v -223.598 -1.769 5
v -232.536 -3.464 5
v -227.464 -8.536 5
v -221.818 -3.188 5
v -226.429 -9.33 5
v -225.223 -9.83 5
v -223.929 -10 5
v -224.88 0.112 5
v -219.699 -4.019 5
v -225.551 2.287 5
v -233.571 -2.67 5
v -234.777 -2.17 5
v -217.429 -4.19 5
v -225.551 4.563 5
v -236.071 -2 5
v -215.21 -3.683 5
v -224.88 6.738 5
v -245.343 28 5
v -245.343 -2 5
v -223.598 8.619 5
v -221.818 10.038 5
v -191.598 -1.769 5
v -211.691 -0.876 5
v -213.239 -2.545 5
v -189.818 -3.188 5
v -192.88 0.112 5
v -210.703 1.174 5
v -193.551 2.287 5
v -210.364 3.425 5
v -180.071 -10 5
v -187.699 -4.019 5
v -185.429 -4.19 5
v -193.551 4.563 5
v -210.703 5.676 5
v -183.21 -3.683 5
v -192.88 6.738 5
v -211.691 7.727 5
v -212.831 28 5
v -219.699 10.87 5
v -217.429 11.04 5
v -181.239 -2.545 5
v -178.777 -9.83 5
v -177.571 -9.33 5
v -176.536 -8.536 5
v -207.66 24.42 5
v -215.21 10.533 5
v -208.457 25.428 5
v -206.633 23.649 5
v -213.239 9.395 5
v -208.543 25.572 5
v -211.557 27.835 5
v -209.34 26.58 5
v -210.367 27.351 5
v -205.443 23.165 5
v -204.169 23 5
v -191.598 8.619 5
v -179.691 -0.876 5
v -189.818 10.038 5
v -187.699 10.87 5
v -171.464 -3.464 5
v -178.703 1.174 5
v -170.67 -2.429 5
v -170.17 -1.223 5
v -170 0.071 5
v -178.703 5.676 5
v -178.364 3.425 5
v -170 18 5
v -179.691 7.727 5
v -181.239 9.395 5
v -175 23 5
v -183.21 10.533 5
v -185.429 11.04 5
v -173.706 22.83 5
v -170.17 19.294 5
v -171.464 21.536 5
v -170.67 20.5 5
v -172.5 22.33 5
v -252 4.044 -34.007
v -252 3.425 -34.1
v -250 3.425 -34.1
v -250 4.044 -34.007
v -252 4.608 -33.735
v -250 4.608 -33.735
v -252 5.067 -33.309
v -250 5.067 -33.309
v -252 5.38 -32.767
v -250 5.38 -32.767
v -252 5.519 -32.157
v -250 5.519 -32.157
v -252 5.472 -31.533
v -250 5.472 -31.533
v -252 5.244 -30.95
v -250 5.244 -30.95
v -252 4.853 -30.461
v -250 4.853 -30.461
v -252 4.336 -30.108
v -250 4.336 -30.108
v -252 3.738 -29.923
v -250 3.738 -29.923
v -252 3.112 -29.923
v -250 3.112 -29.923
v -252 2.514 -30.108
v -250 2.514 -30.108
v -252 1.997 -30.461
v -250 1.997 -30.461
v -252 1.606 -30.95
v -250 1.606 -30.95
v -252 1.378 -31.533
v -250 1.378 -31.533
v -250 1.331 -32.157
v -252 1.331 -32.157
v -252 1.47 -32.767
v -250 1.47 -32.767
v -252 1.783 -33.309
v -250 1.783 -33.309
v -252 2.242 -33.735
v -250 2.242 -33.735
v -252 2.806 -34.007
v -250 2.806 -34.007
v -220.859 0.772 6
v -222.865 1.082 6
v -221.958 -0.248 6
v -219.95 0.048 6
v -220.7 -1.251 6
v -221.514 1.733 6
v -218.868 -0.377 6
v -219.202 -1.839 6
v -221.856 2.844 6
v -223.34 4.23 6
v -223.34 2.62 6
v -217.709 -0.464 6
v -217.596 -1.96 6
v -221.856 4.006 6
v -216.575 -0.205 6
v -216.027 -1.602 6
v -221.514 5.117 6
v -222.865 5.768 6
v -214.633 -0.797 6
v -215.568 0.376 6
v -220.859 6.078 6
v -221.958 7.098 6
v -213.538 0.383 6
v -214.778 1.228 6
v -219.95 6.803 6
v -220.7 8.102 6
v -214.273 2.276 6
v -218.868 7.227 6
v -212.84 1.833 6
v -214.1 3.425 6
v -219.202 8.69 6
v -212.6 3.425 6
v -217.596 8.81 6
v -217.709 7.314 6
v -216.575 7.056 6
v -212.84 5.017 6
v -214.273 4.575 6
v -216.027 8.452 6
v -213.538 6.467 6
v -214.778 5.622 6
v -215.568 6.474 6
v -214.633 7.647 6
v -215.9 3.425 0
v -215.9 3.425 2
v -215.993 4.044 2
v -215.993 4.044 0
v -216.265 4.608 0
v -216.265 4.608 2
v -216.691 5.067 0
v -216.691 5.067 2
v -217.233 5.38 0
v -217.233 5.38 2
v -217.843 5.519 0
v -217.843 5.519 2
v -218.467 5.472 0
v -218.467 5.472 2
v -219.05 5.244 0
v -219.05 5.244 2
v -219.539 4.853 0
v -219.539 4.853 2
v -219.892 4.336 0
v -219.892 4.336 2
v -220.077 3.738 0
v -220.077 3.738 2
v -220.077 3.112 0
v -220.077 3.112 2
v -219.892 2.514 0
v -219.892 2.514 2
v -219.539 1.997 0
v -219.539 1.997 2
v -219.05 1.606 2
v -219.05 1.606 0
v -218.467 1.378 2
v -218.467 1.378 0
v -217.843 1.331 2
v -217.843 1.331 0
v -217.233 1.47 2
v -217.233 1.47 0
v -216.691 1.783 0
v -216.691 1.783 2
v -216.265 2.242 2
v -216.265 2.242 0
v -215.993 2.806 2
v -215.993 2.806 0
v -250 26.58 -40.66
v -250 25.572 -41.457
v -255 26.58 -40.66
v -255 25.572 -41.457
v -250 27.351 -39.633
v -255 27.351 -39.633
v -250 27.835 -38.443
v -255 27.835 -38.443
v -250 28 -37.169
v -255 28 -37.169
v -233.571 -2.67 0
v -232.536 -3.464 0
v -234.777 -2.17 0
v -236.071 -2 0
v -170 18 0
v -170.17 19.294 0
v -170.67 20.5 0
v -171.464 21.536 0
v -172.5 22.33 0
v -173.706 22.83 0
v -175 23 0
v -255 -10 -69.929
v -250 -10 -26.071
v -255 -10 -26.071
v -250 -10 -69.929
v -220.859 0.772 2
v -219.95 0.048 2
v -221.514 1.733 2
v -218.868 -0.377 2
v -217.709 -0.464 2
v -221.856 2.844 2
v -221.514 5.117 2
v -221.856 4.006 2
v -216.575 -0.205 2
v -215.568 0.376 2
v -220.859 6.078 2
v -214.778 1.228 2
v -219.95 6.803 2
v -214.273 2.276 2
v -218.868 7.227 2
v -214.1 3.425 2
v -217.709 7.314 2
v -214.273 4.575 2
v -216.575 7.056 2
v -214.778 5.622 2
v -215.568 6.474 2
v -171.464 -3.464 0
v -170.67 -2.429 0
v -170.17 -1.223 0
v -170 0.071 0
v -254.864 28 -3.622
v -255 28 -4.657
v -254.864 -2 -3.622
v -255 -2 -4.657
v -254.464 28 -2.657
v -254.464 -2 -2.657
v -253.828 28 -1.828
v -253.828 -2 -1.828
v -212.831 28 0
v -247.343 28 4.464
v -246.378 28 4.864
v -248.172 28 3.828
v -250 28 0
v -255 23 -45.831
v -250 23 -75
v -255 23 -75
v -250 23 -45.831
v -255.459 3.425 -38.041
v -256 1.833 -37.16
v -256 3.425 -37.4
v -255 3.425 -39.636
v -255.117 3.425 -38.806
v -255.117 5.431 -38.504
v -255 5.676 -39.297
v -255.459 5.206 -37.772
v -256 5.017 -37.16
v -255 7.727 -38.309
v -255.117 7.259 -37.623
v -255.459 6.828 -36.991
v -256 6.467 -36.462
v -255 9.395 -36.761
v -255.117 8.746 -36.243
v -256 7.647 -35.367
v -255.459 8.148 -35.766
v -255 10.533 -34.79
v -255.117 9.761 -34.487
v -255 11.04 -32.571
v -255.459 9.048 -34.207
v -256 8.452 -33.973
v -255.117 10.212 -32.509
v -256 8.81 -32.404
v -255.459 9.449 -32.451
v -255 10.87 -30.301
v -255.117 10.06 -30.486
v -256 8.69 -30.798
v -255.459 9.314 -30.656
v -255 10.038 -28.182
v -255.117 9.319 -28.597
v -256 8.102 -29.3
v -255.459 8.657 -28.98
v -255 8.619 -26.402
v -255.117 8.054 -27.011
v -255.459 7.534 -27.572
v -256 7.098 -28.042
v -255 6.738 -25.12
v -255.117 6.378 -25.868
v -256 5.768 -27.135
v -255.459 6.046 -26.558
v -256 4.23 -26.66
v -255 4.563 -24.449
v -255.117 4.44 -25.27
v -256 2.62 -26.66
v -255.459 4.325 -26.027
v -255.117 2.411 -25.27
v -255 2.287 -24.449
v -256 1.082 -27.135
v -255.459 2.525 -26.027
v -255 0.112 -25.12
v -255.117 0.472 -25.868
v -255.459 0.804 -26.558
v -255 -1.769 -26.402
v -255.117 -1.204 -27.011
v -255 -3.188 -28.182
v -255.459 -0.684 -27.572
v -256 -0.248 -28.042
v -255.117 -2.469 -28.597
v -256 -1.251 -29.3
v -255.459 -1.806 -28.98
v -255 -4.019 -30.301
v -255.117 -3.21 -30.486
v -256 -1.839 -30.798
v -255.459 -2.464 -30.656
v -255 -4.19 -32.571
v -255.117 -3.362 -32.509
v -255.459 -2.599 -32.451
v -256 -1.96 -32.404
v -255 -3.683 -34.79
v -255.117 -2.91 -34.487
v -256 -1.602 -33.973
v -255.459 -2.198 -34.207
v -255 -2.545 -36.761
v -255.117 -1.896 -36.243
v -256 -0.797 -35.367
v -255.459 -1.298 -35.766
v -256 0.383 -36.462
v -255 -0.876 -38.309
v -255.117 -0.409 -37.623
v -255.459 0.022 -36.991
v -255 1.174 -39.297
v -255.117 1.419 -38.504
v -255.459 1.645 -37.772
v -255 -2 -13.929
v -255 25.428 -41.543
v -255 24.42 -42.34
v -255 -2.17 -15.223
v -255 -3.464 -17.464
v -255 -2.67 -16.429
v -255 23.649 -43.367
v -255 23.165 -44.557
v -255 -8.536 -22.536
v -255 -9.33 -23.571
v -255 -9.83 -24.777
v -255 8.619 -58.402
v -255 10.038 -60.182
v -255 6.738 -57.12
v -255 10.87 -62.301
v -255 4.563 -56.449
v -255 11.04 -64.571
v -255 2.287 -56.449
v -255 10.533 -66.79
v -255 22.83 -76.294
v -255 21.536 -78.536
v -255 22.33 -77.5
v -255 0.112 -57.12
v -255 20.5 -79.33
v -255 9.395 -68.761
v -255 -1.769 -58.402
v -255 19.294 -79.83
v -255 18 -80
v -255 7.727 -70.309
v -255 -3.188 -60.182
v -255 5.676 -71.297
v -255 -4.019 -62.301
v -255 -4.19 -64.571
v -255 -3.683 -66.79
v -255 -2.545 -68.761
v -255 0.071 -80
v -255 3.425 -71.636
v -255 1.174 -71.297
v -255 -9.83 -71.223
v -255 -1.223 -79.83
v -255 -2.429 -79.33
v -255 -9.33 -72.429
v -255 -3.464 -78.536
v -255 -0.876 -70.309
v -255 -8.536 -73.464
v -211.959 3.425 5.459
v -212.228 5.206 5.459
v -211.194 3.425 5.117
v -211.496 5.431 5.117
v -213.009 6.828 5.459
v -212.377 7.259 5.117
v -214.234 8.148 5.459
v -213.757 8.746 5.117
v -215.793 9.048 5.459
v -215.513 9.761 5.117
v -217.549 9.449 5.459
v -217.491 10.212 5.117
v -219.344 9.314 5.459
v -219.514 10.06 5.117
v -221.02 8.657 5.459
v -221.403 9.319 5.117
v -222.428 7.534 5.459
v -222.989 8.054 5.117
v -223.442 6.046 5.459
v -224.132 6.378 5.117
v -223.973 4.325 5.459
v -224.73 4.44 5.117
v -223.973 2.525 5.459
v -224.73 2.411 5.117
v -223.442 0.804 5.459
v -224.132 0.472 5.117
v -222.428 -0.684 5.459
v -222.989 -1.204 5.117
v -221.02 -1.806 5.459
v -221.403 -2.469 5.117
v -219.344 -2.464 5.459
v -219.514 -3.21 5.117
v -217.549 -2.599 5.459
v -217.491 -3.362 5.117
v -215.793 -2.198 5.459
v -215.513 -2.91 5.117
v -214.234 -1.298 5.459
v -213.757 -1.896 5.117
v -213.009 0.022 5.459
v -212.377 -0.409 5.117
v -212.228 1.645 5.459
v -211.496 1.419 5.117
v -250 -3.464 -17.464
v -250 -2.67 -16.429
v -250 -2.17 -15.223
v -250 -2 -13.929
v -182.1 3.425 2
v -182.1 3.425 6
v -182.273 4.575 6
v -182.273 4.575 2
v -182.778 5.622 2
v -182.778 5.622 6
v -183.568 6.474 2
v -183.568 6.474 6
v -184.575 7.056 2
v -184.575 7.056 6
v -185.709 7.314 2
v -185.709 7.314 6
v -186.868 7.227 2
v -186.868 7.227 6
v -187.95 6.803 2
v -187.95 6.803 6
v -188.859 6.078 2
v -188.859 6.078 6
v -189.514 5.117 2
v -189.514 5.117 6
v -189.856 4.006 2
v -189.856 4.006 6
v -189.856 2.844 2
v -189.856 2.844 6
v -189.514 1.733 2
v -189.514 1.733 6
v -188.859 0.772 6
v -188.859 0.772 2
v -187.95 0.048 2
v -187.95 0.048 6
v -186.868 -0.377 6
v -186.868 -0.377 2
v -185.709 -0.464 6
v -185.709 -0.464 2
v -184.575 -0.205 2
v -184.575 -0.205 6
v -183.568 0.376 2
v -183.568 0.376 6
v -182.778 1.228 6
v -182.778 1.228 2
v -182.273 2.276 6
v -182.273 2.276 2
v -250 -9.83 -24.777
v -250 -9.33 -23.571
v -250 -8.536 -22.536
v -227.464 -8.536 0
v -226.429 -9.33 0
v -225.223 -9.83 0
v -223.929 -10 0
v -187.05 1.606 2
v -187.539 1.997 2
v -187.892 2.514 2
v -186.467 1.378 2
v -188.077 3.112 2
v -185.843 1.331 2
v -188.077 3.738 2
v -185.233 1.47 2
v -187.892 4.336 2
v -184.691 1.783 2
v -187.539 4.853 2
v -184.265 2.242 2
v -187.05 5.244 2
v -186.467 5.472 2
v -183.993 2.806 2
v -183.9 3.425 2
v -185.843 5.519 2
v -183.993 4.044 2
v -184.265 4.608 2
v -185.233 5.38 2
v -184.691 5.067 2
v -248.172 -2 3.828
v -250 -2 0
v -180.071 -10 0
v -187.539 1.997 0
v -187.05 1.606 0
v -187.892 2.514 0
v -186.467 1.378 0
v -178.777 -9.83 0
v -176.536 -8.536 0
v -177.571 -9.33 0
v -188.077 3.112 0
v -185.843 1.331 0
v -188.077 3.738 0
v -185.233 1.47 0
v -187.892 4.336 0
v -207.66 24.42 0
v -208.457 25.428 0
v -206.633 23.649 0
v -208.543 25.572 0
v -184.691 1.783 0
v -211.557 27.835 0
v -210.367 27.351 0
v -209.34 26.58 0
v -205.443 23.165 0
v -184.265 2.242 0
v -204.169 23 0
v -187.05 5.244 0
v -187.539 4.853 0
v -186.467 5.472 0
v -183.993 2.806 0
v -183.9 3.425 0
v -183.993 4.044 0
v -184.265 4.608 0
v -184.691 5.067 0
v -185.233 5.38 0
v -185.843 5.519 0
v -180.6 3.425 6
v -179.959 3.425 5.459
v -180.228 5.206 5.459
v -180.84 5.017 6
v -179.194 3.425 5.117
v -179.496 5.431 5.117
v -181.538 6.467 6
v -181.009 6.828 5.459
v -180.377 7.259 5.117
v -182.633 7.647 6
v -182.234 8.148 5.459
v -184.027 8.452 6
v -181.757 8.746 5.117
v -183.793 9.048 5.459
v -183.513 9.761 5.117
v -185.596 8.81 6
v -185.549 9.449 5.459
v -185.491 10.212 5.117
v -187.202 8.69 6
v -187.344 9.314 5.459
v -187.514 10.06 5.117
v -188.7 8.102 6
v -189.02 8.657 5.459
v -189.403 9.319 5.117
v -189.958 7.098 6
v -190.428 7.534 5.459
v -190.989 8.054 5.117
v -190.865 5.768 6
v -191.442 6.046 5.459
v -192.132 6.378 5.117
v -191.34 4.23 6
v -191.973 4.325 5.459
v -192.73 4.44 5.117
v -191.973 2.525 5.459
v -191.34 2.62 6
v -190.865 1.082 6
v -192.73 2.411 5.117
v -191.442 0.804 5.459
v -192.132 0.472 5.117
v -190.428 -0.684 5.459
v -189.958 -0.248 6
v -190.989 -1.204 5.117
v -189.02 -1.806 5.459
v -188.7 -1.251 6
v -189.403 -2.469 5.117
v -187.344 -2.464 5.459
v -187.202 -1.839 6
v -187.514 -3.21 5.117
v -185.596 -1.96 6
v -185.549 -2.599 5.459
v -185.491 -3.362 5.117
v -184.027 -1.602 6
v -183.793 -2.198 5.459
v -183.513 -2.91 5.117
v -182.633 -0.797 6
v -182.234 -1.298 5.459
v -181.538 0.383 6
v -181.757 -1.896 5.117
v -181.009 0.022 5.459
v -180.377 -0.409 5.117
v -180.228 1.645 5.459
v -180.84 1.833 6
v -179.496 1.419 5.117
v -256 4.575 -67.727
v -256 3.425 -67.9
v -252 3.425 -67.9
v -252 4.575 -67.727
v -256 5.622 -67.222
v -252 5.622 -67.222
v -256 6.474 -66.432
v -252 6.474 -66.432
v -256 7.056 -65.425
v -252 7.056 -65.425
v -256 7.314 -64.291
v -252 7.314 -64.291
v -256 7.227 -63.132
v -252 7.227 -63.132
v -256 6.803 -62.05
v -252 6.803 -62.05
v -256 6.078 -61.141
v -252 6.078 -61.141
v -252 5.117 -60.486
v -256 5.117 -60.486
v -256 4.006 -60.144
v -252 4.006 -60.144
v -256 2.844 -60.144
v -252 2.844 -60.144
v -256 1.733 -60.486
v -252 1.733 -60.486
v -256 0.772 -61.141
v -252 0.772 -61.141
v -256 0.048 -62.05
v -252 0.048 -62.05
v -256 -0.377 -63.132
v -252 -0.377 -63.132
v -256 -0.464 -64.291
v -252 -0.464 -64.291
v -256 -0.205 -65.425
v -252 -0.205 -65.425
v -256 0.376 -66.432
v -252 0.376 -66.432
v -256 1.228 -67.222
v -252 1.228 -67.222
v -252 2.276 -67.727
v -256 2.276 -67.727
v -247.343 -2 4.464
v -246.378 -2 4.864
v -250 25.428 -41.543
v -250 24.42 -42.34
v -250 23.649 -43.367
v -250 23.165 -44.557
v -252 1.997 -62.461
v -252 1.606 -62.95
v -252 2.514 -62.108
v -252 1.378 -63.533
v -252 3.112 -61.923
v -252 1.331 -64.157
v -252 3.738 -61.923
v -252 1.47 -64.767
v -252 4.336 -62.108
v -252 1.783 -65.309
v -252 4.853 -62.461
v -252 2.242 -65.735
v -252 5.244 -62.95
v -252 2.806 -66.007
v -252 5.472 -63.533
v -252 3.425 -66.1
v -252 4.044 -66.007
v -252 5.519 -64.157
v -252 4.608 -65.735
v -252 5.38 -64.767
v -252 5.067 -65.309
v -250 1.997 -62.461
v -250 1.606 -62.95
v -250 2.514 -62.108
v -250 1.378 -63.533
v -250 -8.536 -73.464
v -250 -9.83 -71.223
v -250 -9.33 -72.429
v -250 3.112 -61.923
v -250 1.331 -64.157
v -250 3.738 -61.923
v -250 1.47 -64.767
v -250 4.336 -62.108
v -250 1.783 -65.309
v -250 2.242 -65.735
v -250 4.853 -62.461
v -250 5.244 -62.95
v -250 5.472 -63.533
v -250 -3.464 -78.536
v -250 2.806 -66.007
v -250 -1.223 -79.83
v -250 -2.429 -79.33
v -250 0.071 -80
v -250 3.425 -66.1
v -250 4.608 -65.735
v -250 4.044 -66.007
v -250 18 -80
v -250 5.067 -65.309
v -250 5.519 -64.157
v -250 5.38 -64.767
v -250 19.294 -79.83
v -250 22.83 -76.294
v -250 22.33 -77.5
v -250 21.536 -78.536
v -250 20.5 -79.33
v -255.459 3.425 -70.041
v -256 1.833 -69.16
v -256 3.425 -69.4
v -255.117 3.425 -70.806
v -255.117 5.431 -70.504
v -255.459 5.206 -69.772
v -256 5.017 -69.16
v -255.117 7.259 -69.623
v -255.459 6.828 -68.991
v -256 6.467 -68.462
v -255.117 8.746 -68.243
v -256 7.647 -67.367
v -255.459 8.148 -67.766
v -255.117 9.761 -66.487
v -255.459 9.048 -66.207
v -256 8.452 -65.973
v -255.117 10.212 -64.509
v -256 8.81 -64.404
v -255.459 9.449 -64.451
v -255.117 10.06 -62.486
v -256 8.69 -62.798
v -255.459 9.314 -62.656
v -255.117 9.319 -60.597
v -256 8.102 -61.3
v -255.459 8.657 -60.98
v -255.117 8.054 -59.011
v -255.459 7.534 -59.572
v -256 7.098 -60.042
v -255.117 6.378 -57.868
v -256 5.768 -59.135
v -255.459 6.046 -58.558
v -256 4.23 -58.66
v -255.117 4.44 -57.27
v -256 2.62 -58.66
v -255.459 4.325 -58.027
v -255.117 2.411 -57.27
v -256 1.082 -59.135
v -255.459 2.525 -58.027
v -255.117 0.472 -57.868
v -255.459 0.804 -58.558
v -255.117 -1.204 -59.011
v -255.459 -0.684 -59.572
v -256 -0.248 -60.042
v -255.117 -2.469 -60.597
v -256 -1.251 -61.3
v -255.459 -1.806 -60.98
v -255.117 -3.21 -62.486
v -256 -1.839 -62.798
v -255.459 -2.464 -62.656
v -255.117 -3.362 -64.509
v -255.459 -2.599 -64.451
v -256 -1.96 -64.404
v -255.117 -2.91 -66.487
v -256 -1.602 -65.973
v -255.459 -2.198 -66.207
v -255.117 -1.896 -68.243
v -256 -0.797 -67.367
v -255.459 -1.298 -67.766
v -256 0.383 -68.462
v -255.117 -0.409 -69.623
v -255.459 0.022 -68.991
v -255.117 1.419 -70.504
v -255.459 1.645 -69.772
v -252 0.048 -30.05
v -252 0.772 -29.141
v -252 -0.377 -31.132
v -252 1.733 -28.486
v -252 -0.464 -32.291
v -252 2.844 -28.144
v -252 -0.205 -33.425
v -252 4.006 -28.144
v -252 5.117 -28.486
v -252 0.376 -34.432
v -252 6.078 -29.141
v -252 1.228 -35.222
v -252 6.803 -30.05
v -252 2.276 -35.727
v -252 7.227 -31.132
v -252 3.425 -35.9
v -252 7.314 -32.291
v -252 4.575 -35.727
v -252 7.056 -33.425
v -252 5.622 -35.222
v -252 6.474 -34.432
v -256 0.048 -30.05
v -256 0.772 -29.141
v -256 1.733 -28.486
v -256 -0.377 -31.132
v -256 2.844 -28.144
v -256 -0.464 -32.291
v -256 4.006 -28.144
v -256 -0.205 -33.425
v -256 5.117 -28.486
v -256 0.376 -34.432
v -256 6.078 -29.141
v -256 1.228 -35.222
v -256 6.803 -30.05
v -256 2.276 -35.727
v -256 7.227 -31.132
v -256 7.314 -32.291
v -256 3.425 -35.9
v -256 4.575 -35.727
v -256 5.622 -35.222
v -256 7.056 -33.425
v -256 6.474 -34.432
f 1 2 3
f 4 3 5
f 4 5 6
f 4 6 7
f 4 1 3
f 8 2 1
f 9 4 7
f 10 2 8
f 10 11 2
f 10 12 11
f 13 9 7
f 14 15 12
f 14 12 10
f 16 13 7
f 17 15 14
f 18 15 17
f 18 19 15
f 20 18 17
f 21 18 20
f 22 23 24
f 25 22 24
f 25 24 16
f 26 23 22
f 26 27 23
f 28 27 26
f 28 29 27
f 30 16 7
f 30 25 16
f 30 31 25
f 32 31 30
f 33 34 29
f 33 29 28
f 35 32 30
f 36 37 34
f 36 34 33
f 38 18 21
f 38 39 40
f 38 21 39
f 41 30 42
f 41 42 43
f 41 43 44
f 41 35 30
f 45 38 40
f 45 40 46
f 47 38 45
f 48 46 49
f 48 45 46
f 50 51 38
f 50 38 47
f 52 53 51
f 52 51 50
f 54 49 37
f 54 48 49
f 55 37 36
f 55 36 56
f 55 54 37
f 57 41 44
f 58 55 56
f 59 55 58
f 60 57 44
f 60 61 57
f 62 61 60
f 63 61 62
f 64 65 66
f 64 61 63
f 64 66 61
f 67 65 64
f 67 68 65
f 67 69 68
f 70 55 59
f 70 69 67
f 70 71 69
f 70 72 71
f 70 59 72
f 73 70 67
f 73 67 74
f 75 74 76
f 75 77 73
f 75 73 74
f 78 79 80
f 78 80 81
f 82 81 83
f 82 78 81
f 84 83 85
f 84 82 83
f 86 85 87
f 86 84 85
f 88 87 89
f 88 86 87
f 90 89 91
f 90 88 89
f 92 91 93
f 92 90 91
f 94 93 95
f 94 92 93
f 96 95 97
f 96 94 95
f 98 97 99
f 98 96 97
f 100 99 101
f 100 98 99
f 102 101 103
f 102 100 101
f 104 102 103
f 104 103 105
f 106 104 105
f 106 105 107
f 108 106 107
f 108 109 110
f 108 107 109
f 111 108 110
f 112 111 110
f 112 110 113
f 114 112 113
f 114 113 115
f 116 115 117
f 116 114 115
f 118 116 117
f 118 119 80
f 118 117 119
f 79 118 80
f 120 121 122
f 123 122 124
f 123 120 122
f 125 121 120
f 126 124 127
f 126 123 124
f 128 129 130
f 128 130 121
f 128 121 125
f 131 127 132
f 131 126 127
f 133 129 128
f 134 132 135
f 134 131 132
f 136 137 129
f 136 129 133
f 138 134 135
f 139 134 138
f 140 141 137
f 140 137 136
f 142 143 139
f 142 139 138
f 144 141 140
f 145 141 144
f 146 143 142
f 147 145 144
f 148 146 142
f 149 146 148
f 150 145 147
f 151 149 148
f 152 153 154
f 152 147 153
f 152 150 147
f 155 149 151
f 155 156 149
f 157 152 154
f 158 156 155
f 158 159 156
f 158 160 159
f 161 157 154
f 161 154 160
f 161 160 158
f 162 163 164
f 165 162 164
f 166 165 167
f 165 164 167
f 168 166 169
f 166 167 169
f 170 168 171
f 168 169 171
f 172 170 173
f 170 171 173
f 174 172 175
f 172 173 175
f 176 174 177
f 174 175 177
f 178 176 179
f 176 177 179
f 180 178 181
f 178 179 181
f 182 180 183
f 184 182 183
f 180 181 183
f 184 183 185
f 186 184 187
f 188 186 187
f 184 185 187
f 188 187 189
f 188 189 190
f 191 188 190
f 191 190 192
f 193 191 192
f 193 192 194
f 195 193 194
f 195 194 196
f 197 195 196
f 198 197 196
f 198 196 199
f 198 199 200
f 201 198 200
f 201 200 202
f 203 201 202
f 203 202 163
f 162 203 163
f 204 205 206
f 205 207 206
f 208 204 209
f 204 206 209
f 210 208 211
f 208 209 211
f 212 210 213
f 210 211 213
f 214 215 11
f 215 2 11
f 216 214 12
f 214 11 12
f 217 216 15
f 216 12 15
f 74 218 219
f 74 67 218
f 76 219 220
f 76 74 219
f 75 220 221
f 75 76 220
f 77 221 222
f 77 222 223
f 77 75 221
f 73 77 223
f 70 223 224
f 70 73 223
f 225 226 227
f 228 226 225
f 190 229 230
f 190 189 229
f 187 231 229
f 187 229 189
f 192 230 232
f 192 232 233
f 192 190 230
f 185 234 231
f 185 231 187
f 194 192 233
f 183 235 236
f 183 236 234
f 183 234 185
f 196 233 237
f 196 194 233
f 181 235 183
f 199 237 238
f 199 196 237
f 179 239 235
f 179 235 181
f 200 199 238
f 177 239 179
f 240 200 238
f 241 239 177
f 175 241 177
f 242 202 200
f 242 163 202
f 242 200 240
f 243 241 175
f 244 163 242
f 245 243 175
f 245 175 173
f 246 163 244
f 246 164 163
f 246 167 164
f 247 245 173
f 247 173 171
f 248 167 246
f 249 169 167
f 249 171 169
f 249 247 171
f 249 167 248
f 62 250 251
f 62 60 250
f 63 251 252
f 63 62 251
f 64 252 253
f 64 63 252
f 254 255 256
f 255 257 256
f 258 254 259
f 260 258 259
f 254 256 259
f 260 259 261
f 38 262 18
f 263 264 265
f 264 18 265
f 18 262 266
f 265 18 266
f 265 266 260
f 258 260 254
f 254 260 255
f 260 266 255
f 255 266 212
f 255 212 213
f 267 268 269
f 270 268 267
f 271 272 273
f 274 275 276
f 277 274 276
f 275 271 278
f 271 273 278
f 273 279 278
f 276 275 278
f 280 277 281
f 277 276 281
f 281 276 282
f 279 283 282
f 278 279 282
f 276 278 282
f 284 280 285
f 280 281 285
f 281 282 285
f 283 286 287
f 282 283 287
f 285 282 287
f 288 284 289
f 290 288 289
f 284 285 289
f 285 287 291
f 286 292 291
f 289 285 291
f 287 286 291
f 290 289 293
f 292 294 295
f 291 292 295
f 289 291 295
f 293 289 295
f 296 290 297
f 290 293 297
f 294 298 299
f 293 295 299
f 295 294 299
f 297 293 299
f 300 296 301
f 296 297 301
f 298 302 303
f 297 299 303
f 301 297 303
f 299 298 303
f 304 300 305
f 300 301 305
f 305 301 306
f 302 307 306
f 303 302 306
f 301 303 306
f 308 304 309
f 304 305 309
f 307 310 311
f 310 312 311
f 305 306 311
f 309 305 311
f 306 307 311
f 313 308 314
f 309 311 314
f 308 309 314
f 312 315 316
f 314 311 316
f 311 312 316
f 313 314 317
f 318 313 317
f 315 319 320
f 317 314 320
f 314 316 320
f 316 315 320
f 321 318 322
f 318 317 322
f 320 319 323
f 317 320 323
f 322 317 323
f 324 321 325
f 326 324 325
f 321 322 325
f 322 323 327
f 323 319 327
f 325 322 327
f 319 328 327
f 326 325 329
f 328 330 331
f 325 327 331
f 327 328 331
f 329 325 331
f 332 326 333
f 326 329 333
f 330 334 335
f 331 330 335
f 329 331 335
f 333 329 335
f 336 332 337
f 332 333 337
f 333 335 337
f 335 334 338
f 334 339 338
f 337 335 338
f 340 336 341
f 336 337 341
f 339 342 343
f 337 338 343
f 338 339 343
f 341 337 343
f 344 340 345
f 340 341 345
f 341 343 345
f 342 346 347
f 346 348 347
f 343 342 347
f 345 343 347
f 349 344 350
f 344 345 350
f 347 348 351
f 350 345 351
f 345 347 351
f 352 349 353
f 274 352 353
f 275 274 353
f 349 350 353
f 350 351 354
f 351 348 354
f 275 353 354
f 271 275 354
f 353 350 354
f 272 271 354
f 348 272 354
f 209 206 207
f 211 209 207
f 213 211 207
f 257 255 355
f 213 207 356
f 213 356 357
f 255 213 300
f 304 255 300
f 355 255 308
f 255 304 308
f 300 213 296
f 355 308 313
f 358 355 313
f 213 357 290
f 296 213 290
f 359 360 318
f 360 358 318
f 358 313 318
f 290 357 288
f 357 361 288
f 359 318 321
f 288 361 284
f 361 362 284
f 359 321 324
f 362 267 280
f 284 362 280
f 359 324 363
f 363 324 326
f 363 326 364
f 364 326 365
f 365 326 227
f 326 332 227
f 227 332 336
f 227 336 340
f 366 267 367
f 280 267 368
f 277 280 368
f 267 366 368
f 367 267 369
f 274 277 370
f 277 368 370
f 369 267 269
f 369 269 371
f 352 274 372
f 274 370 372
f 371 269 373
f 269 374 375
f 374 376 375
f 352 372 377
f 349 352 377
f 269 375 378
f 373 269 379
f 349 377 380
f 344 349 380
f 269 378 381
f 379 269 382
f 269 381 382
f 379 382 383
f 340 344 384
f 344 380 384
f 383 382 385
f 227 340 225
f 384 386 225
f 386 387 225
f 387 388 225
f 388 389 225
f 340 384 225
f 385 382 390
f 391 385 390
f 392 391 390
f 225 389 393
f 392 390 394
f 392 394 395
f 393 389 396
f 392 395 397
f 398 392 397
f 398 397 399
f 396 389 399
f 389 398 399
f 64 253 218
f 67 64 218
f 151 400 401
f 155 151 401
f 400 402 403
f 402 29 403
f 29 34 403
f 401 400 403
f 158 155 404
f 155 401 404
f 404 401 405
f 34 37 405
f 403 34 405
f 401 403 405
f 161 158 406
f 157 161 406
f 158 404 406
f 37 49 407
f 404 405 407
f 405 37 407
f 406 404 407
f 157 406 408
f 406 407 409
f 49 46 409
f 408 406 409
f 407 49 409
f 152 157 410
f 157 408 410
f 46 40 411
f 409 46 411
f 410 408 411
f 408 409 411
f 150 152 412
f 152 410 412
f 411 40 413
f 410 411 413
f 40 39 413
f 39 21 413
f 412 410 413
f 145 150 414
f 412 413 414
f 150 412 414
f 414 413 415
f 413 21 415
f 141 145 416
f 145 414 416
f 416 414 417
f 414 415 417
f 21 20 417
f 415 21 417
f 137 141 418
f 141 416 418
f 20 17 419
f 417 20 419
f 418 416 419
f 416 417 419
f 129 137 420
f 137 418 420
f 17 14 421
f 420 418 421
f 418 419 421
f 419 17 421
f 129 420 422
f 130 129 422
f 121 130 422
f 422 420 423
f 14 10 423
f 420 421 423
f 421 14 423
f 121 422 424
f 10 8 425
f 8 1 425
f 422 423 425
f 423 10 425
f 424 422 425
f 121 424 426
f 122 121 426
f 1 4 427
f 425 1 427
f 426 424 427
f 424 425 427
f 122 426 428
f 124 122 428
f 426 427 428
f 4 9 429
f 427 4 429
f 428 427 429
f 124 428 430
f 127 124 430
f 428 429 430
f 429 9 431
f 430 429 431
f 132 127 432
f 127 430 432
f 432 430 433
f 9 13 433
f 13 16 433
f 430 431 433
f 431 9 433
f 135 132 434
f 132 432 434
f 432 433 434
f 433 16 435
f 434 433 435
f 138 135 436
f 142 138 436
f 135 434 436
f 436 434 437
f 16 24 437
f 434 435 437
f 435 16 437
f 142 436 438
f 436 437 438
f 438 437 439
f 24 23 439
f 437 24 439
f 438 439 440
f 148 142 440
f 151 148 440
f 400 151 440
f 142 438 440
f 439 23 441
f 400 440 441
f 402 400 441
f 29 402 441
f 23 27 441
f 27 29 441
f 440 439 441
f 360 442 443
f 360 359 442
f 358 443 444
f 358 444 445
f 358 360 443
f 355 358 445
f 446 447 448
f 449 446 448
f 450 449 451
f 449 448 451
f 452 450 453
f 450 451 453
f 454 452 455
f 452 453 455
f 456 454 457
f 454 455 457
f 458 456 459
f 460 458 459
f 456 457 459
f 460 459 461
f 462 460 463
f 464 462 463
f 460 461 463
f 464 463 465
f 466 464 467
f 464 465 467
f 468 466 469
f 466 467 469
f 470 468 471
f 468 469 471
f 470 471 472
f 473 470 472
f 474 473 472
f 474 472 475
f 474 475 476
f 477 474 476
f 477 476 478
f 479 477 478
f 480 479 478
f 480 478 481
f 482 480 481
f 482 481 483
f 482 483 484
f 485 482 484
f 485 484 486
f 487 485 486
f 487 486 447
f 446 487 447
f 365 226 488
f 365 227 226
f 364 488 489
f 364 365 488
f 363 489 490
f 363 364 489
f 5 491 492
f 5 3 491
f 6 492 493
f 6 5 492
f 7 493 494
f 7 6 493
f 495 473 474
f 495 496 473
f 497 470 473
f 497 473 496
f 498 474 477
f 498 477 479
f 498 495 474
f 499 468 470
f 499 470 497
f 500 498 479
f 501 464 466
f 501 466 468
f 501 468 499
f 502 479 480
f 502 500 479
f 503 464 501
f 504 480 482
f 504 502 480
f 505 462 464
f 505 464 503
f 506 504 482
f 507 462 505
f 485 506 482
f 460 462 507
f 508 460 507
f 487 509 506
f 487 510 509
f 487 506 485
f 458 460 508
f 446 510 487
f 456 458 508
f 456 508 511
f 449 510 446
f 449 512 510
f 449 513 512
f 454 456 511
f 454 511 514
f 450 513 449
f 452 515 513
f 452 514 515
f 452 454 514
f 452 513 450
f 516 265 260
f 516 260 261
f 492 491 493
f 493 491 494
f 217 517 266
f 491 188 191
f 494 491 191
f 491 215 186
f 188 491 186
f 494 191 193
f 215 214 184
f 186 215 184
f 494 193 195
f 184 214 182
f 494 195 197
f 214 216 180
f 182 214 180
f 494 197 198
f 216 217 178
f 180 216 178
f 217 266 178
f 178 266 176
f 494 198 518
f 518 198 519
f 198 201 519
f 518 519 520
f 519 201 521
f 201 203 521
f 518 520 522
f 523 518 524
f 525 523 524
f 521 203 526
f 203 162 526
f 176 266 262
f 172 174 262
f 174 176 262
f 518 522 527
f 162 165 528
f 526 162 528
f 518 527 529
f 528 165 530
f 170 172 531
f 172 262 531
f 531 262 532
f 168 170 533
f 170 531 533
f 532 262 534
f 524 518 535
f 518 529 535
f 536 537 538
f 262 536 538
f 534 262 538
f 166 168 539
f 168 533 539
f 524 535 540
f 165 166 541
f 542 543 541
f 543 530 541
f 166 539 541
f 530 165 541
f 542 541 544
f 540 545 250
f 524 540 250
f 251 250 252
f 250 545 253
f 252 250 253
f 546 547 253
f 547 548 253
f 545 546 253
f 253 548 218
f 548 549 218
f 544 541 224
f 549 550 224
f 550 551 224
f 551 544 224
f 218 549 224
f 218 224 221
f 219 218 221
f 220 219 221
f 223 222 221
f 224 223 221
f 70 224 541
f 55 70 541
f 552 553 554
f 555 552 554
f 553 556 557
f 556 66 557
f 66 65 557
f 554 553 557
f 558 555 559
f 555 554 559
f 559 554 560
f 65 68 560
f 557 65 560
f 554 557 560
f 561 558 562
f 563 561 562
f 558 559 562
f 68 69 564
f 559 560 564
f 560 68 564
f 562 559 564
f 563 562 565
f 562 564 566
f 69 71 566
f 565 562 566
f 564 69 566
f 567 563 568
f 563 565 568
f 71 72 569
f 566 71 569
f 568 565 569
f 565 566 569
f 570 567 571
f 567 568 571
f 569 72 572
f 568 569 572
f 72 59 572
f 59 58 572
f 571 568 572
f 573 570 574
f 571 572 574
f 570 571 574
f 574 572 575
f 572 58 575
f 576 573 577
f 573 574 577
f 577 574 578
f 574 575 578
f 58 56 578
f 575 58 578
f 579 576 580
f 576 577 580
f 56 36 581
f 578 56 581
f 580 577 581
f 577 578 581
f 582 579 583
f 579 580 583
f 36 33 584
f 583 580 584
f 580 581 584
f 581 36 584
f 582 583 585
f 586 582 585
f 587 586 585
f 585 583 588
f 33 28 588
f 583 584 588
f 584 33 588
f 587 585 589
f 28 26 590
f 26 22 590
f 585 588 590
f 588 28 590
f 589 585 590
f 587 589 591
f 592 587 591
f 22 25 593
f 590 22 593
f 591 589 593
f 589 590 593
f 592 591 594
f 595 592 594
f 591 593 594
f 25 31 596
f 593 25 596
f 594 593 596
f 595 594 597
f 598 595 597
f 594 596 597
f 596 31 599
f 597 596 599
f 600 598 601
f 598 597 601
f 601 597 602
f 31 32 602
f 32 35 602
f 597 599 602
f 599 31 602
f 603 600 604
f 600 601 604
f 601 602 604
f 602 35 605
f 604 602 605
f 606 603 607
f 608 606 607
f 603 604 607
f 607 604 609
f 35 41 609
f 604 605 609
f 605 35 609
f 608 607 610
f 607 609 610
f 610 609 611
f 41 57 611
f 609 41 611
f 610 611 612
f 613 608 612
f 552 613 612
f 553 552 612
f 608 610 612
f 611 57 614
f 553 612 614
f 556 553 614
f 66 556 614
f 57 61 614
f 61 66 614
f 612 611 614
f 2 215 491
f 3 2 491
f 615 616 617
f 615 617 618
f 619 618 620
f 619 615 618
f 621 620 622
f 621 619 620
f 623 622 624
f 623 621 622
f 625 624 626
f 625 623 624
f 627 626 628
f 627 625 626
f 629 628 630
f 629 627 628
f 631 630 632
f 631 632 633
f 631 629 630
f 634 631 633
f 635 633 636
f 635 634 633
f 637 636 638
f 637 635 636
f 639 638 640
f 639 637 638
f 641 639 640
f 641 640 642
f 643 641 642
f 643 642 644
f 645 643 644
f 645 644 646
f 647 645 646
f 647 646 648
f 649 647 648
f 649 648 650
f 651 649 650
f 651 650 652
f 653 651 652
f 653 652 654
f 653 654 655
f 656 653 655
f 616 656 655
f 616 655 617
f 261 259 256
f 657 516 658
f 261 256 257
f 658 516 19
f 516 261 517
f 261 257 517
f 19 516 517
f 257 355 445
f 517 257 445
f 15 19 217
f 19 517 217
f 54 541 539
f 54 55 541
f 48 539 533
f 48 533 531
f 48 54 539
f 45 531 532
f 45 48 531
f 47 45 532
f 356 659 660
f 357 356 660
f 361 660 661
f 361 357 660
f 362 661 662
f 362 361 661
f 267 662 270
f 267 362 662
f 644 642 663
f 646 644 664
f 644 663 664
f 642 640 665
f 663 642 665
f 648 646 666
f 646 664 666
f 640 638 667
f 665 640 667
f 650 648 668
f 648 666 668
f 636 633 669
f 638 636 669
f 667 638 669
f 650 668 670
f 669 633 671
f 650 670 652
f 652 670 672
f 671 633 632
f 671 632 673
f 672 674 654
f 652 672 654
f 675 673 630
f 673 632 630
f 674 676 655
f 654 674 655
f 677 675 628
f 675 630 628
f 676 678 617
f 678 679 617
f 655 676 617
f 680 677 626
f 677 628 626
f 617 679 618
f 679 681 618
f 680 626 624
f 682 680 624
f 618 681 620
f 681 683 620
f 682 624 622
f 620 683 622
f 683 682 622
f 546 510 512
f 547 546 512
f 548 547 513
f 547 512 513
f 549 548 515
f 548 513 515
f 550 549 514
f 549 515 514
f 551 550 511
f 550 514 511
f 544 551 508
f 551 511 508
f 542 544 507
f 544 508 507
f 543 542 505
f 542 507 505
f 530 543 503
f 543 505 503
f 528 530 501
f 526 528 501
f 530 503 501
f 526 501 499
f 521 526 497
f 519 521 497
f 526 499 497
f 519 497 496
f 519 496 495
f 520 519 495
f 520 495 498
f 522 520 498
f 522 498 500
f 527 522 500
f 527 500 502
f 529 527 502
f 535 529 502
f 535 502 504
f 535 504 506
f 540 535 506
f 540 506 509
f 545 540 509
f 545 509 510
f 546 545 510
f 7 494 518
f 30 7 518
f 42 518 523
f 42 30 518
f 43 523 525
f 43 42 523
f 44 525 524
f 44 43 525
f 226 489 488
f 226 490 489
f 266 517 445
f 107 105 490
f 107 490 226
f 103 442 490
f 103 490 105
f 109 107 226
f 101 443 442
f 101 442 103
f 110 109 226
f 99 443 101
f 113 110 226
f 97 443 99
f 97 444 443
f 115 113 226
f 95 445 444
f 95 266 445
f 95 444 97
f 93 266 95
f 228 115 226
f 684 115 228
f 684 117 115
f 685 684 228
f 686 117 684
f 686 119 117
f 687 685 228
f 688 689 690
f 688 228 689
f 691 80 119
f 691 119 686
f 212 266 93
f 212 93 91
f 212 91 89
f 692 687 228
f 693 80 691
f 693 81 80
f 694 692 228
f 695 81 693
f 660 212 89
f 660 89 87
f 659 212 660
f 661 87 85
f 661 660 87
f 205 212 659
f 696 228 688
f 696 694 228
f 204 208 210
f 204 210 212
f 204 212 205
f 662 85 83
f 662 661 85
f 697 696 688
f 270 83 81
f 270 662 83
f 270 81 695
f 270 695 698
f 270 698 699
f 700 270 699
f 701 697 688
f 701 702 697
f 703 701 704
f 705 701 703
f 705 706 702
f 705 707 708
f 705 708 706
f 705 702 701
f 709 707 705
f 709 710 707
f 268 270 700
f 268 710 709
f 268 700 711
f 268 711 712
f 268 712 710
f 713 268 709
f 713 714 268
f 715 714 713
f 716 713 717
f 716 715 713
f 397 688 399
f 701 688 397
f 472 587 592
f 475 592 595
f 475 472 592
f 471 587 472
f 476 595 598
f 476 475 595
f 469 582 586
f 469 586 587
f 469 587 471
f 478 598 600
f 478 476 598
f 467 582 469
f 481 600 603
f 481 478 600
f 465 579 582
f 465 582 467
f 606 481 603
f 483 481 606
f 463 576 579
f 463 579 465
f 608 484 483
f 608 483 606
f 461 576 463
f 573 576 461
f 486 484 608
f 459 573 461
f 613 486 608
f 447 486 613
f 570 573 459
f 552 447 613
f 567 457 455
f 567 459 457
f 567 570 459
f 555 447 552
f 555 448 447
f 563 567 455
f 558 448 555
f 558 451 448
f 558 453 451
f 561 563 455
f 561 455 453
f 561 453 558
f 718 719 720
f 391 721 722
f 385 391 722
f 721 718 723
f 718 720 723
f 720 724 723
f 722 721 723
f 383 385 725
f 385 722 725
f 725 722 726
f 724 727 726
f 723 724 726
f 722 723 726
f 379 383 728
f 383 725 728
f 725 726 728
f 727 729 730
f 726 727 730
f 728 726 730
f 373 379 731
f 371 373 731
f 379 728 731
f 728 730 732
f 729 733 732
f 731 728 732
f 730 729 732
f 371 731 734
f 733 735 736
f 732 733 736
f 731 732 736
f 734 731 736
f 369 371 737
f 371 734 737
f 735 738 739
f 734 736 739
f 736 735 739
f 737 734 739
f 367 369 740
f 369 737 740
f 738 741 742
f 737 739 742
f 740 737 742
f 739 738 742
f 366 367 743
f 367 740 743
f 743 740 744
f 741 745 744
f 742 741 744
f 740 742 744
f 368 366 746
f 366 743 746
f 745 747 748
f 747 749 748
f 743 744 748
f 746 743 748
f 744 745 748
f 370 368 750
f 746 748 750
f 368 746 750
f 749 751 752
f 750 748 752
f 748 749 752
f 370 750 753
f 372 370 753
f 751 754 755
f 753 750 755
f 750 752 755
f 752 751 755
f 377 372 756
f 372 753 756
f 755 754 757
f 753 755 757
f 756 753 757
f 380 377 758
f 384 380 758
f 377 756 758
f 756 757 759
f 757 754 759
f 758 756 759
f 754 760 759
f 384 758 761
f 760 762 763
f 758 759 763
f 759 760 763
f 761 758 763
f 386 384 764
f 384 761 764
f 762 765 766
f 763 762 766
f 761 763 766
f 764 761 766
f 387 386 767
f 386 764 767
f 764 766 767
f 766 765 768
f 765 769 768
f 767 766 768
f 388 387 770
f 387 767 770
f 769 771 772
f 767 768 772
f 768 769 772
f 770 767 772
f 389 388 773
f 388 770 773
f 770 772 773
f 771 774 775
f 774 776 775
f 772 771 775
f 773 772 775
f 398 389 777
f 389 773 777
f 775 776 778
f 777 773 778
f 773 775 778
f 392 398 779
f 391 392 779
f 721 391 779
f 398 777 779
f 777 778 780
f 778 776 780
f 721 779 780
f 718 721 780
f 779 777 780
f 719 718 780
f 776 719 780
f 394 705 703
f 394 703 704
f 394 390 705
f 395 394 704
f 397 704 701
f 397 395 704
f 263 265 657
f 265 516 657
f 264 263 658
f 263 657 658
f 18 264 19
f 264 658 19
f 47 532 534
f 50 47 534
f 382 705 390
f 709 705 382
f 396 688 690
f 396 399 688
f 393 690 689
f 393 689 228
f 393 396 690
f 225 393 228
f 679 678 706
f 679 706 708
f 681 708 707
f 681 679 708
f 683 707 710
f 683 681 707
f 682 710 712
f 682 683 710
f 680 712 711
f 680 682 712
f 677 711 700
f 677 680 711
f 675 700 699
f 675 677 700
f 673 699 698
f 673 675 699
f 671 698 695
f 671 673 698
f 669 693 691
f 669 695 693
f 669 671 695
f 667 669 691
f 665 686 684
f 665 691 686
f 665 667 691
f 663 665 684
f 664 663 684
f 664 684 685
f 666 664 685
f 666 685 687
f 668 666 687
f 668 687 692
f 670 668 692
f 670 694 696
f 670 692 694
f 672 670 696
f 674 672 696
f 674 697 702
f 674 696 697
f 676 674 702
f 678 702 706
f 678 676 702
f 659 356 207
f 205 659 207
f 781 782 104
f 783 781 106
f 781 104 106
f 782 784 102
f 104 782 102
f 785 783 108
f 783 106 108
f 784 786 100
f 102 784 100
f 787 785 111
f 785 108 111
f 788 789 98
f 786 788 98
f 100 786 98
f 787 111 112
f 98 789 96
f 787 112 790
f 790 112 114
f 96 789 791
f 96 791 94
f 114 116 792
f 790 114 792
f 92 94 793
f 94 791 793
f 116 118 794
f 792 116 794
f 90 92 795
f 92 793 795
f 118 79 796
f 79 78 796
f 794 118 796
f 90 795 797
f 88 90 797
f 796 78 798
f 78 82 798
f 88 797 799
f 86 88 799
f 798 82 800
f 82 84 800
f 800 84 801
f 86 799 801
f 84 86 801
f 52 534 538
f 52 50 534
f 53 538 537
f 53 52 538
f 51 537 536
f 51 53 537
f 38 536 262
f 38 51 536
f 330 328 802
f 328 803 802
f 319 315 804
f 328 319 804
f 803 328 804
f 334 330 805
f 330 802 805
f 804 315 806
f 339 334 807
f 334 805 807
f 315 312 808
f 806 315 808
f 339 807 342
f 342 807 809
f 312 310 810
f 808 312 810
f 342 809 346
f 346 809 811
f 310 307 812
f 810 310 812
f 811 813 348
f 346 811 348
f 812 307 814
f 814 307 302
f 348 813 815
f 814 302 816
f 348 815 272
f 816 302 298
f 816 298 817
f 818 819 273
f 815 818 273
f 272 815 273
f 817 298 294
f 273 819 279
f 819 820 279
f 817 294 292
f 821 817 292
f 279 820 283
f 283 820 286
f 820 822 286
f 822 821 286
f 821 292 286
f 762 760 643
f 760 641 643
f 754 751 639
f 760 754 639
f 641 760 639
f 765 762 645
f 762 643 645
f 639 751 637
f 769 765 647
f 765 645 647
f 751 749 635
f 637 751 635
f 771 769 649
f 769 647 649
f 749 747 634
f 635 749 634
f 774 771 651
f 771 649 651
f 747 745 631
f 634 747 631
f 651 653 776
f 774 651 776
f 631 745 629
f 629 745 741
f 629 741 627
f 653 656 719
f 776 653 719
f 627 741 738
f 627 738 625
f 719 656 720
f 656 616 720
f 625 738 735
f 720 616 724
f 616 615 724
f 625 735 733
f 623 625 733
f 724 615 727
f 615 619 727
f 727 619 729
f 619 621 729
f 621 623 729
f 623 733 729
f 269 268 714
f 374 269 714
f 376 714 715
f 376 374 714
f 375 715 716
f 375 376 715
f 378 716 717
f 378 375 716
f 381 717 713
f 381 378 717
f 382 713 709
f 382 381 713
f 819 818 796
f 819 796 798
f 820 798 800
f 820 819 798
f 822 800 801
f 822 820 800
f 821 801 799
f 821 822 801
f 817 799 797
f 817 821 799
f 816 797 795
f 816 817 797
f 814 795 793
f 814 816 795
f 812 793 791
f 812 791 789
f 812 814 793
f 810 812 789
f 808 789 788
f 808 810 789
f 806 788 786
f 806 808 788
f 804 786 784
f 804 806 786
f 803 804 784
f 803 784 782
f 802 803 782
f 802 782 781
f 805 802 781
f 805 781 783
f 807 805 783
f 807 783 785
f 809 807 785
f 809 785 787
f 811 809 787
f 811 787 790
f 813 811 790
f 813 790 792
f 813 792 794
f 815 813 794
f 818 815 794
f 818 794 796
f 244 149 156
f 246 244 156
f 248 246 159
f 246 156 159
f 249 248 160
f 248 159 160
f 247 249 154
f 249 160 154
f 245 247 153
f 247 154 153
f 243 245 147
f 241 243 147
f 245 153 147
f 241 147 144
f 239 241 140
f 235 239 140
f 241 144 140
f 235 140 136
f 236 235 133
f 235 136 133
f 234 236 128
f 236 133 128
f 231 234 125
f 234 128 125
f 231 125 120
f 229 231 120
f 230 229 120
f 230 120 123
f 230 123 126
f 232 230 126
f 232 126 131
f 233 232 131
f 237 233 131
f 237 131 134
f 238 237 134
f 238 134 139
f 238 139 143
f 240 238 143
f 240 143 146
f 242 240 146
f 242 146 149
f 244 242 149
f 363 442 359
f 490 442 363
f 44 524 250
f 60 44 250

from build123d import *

# Parameters (mm, degrees)
BOSS_EXTRUDE1_DEPTH = 5
FILLET1_R           = 5
CHAMFER1_SIZE       = 8
FILLET2_R           = 4
SKETCH2_R           = 2.1
CUT_EXTRUDE1_DEPTH  = 271.24803422
SKETCH3_R           = 3.9
CUT_EXTRUDE2_DEPTH  = 3
BOSS_EXTRUDE2_START = 1
SKETCH4_R           = 5.4
SKETCH4_R_2         = 3.9
BOSS_EXTRUDE2_DEPTH = 1
FILLET3_R           = 3


with BuildPart() as part:
    # Sketch1 → Boss-Extrude1 (new body)
    with BuildSketch(Plane.XY):
        Polygon((-255, 28), (-255, -2), (-234, -2), (-226, -10), (-178, -10), (-170, -2), (-170, 23), (-207, 23), (-210, 28), align=None)
    boss_extrude1 = extrude(amount=BOSS_EXTRUDE1_DEPTH)

    # Mirror1: Boss-Extrude1 across plane
    add(boss_extrude1.mirror(Plane(origin=(-125, 0, -125), x_dir=(-0.7071067811865489, 0, 0.7071067811865462), z_dir=(-0.7071067811865464, 0, -0.7071067811865488))))

    # Fillet1
    fillet1_edges = [part.edges().sort_by_distance(p)[0] for p in [
        (-210, 28, 2.5),
        (-207, 23, 2.5),
        (-170, 23, 2.5),
        (-170, -2, 2.5),
        (-178, -10, 2.5),
        (-226, -10, 2.5),
        (-234, -2, 2.5),
        (-252.5, -2, -16),
        (-252.5, 28, -40),
        (-252.5, 23, -43),
        (-252.5, 23, -80),
        (-252.5, -2, -80),
        (-252.5, -10, -72),
        (-252.5, -10, -24),
    ]]
    fillet(fillet1_edges, radius=FILLET1_R)

    # Chamfer1
    chamfer1_edges = [part.edges().sort_by_distance(p)[0] for p in [
        (-255, 13, 5),
    ]]
    chamfer(chamfer1_edges, length=CHAMFER1_SIZE)

    # Fillet2
    fillet2_edges = [part.edges().sort_by_distance(p)[0] for p in [
        (-247, 13, 5),
        (-255, 13, -3),
    ]]
    fillet(fillet2_edges, radius=FILLET2_R)

    # Sketch2 → Cut-Extrude1 (cut, through all)
    with BuildSketch(Plane.XY.offset(5)):
        with Locations((-218, 3.425126266)):
            Circle(SKETCH2_R)
        with Locations((-186, 3.425126266)):
            Circle(SKETCH2_R)
    cut_extrude1 = extrude(amount=-CUT_EXTRUDE1_DEPTH, mode=Mode.SUBTRACT)

    # Sketch3 → Cut-Extrude2 (cut)
    with BuildSketch(Plane.XY.offset(5)):
        with Locations((-218, 3.425126266)):
            Circle(SKETCH3_R)
        with Locations((-186, 3.425126266)):
            Circle(SKETCH3_R)
    cut_extrude2 = extrude(amount=-CUT_EXTRUDE2_DEPTH, mode=Mode.SUBTRACT)

    # Sketch4 → Boss-Extrude2 (add)
    # profile 1 of 2: a face of its own
    with BuildSketch(Plane.XY.offset(5).offset(BOSS_EXTRUDE2_START)):
        with Locations((-218, 3.425126266)):
            Circle(SKETCH4_R)
        with Locations((-218, 3.425126266)):
            Circle(SKETCH4_R_2, mode=Mode.SUBTRACT)
    # profile 2 of 2: a face of its own
    with BuildSketch(Plane.XY.offset(5).offset(BOSS_EXTRUDE2_START)):
        with Locations((-186, 3.425126266)):
            Circle(SKETCH4_R)
        with Locations((-186, 3.425126266)):
            Circle(SKETCH4_R_2, mode=Mode.SUBTRACT)
    boss_extrude2 = extrude(amount=-BOSS_EXTRUDE2_DEPTH)

    # Mirror2: Cut-Extrude1, Cut-Extrude2, Boss-Extrude2 across plane
    add(cut_extrude1.mirror(Plane(origin=(-125, 0, -125), x_dir=(-0.7071067811865489, 0, 0.7071067811865462), z_dir=(-0.7071067811865464, 0, -0.7071067811865488))), mode=Mode.SUBTRACT)
    add(cut_extrude2.mirror(Plane(origin=(-125, 0, -125), x_dir=(-0.7071067811865489, 0, 0.7071067811865462), z_dir=(-0.7071067811865464, 0, -0.7071067811865488))), mode=Mode.SUBTRACT)
    add(boss_extrude2.mirror(Plane(origin=(-125, 0, -125), x_dir=(-0.7071067811865489, 0, 0.7071067811865462), z_dir=(-0.7071067811865464, 0, -0.7071067811865488))))

    # Fillet3
    # the kernel refuses this fillet: 3 mm, written as the material it adds along each edge
    with BuildSketch(Plane(origin=(-218, 3.425126266, 5), x_dir=(1, 0, 0), z_dir=(0, -1, 0))) as fillet3_piece_1:
        with BuildLine():
            CenterArc((7.636067977, 3), FILLET3_R, 221.810314896, 48.189685104)
            Line((5.4, 1), (5.35527864, 0.96))
            ThreePointArc((5.35527864, 0.96), (5.34, 0.5), (5.34, 0))
            Line((5.34, 0), (5.4, -0.06))
            Line((5.4, -0.06), (7.636067977, -0.06))
            Line((7.636067977, -0.06), (7.636067977, 0))
        make_face()
    revolve(axis=Axis((-218, 3.425126266, 5), (0, 0, 1)))
    with BuildSketch(Plane(origin=(-186, 3.425126266, 5), x_dir=(1, 0, 0), z_dir=(0, -1, 0))) as fillet3_piece_2:
        with BuildLine():
            CenterArc((7.636067977, 3), FILLET3_R, 221.810314896, 48.189685104)
            Line((7.636067977, 0), (7.636067977, -0.06))
            Line((7.636067977, -0.06), (5.4, -0.06))
            Line((5.4, -0.06), (5.34, 0))
            ThreePointArc((5.34, 0), (5.34, 0.5), (5.35527864, 0.96))
            Line((5.35527864, 0.96), (5.4, 1))
        make_face()
    revolve(axis=Axis((-186, 3.425126266, 5), (0, 0, 1)))
    with BuildSketch(Plane(origin=(-255, 3.425126266, -32), x_dir=(0, 0, -1), z_dir=(0, -1, 0))) as fillet3_piece_3:
        with BuildLine():
            CenterArc((7.636067977, -3), FILLET3_R, 90, 48.189685104)
            Line((5.4, -1), (5.35527864, -0.96))
            ThreePointArc((5.35527864, -0.96), (5.34, -0.5), (5.34, 0))
            Line((5.34, 0), (5.4, 0.06))
            Line((5.4, 0.06), (7.636067977, 0.06))
            Line((7.636067977, 0.06), (7.636067977, 0))
        make_face()
    revolve(axis=Axis((-255, 3.425126266, -32), (1, 0, 0)))
    with BuildSketch(Plane(origin=(-255, 3.425126266, -64), x_dir=(0, 0, -1), z_dir=(0, -1, 0))) as fillet3_piece_4:
        with BuildLine():
            CenterArc((7.636067977, -3), FILLET3_R, 90, 48.189685104)
            Line((5.4, -1), (5.35527864, -0.96))
            ThreePointArc((5.35527864, -0.96), (5.34, -0.5), (5.34, 0))
            Line((5.34, 0), (5.4, 0.06))
            Line((5.4, 0.06), (7.636067977, 0.06))
            Line((7.636067977, 0.06), (7.636067977, 0))
        make_face()
    revolve(axis=Axis((-255, 3.425126266, -64), (1, 0, 0)))


solid = part.part
